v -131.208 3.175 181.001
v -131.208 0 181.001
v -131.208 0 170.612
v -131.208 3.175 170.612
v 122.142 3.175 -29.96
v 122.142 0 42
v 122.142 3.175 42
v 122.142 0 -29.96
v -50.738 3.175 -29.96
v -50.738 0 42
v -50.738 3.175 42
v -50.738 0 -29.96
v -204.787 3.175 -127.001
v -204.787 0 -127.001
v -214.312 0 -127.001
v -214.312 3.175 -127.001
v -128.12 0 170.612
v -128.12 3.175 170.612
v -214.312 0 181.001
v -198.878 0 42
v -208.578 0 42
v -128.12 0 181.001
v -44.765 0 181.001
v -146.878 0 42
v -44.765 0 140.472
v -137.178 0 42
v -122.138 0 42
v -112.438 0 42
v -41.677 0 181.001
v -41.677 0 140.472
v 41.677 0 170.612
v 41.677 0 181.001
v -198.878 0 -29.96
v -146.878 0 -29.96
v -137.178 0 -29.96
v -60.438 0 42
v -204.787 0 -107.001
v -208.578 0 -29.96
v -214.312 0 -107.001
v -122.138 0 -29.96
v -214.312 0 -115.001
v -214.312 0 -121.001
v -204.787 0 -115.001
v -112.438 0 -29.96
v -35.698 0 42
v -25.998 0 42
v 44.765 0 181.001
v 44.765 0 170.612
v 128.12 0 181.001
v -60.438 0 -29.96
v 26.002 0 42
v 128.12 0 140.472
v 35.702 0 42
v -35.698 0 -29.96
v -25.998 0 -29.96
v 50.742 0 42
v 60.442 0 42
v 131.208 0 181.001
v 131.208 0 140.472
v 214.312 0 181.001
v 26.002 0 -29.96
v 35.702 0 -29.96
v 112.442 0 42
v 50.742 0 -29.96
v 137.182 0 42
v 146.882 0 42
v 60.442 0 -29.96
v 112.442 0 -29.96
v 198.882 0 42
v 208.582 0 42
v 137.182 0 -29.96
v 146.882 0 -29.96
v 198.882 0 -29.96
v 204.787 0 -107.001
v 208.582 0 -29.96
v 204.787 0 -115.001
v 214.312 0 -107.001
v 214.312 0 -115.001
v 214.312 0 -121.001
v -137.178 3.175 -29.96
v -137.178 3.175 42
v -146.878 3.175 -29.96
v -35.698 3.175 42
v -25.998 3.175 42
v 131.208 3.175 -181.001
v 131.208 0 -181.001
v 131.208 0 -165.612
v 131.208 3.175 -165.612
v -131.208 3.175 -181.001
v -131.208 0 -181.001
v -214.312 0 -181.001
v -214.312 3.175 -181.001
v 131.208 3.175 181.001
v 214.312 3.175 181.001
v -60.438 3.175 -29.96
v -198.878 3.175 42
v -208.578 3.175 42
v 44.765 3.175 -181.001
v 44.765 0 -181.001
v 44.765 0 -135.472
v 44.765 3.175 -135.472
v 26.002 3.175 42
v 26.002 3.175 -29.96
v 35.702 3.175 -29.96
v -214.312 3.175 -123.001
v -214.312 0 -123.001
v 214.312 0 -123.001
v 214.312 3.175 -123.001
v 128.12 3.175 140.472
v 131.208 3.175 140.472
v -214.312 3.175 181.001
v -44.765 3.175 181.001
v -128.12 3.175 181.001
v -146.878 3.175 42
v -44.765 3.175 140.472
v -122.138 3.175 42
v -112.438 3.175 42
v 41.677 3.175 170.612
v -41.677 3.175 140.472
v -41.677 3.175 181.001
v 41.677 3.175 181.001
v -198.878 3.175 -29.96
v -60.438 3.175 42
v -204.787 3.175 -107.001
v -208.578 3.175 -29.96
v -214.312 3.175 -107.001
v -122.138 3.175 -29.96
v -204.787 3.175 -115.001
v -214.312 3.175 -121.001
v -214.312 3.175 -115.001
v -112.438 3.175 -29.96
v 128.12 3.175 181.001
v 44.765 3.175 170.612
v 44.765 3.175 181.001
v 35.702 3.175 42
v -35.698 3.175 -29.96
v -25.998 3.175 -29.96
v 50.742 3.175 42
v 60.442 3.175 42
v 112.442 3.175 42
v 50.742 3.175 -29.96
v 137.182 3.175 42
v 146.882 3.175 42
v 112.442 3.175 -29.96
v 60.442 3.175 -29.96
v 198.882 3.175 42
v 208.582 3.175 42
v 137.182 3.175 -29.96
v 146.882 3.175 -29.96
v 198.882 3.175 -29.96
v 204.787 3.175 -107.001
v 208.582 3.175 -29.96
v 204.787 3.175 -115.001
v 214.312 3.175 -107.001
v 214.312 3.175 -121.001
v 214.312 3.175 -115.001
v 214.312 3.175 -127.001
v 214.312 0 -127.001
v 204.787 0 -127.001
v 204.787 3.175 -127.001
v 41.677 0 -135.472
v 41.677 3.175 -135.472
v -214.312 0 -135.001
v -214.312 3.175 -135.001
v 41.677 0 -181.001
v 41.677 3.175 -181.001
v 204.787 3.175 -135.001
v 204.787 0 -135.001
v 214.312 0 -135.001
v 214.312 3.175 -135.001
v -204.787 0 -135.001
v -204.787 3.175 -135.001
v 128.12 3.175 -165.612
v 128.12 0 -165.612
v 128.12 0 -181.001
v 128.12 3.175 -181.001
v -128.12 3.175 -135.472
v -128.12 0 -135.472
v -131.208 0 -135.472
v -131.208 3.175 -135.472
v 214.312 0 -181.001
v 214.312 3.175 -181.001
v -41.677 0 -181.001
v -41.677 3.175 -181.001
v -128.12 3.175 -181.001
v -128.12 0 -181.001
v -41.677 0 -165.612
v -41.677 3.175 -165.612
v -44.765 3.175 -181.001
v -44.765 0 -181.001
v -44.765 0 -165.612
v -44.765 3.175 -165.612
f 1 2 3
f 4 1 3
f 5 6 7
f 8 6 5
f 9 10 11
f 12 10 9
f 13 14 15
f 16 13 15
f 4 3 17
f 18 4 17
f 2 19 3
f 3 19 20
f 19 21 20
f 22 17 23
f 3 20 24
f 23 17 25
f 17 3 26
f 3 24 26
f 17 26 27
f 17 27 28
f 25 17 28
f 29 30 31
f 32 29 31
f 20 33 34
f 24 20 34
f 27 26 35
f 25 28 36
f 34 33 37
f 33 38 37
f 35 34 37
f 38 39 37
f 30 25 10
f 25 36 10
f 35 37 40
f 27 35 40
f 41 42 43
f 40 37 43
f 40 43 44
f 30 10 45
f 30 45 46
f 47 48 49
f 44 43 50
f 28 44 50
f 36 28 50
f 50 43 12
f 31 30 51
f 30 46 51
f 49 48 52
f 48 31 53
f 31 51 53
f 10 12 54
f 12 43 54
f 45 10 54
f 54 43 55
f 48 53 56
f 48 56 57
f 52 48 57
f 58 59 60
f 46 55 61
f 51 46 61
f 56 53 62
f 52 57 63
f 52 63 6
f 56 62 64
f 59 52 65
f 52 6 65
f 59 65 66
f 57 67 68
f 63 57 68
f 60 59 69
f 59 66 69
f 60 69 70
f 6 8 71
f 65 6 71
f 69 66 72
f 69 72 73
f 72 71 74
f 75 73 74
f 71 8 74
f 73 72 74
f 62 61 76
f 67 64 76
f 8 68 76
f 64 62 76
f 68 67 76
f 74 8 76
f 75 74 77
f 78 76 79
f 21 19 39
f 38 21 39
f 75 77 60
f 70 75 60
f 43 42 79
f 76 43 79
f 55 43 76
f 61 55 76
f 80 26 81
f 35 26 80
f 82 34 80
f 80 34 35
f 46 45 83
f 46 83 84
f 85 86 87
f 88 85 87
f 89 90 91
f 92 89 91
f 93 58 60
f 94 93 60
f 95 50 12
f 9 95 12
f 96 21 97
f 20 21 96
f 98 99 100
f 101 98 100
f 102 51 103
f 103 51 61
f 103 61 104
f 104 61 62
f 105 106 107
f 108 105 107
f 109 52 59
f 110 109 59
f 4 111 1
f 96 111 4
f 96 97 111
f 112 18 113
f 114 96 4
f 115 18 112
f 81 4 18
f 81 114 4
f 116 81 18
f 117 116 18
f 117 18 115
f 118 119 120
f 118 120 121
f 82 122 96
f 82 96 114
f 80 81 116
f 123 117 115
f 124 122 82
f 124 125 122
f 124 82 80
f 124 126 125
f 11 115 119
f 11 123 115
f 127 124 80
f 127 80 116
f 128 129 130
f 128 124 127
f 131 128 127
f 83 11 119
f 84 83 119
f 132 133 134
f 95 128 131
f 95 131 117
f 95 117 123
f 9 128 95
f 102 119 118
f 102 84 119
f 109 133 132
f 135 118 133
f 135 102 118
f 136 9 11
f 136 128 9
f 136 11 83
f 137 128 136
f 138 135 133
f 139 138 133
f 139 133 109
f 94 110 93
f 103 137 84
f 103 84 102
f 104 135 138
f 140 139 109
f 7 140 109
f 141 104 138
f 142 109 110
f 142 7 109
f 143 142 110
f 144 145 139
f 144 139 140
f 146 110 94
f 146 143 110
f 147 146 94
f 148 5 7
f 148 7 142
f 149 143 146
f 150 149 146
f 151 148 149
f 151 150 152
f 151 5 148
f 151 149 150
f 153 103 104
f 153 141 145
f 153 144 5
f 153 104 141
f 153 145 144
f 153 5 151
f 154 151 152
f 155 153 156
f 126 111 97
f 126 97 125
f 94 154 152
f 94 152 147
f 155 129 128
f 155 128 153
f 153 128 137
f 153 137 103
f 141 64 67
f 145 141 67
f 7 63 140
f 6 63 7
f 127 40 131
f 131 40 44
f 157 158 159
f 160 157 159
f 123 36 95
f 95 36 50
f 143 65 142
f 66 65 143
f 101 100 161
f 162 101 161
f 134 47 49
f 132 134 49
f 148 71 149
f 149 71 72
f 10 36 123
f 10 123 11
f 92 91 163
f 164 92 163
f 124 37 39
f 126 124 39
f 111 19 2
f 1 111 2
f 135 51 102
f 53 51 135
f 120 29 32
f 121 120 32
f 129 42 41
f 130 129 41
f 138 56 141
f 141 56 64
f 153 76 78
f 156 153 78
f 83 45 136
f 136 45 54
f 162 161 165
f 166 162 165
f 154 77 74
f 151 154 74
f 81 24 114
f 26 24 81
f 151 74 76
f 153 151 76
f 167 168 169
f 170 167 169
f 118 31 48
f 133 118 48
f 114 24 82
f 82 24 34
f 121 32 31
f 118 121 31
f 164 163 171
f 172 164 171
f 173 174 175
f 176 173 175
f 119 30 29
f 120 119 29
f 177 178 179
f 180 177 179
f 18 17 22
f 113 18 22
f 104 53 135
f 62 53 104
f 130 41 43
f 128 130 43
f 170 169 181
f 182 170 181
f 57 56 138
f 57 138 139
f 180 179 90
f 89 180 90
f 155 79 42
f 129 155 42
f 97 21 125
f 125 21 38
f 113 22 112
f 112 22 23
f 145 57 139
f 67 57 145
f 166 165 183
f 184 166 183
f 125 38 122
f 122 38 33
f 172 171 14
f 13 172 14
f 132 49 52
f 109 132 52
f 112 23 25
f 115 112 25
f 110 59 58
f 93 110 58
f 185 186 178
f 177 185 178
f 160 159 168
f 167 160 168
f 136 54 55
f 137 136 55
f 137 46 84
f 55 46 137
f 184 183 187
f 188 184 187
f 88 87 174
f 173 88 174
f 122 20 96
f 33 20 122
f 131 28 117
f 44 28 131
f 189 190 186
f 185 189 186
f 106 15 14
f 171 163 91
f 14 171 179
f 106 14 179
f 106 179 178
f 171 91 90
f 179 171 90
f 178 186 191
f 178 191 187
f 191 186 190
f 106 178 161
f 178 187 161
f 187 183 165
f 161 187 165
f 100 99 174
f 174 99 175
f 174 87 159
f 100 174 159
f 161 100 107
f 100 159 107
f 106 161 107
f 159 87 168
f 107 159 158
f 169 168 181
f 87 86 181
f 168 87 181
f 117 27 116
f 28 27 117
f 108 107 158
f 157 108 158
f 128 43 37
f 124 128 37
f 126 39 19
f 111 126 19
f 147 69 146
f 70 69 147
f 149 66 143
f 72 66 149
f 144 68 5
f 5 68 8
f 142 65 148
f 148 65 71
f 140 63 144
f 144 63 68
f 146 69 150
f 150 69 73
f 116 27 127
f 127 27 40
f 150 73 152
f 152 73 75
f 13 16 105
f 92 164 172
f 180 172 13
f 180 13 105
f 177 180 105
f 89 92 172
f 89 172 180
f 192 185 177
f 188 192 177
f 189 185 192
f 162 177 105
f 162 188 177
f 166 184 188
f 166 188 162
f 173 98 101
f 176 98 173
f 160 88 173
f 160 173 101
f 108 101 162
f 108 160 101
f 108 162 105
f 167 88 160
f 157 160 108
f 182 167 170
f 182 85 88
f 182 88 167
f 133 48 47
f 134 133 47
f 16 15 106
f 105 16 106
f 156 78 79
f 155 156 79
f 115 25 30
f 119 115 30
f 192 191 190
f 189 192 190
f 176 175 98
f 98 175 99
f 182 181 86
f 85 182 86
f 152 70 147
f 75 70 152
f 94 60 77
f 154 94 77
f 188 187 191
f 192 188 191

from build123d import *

# Parameters (mm, degrees)
SKETCH1_W           = 9.7
SKETCH1_H           = 71.96
BOSS_EXTRUDE1_DEPTH = 3.175
BOSS_EXTRUDE2_DEPTH = 3.175


with BuildPart() as part:
    # Sketch1 → Boss-Extrude1 (new body)
    with BuildSketch(Plane(origin=(0, 0, 0), x_dir=(1, 0, 0), z_dir=(0, 1, 0))):
        Polygon((-214.312, 121.0008), (-214.312, 115.0008), (-204.787, 115.0008), (-204.787, 107.0008), (-214.312, 107.0008), (-214.312, -181.0008), (-131.2076, -181.0008), (-131.2076, -170.612), (-128.1196, -170.612), (-128.1196, -181.0008), (-44.7652, -181.0008), (-44.7652, -140.472), (-41.6772, -140.472), (-41.6772, -181.0008), (41.6772, -181.0008), (41.6772, -170.612), (44.7652, -170.612), (44.7652, -181.0008), (128.1196, -181.0008), (128.1196, -140.472), (131.2076, -140.472), (131.2076, -181.0008), (214.312, -181.0008), (214.312, 107.0008), (204.787, 107.0008), (204.787, 115.0008), (214.312, 115.0008), (214.312, 121.0008), align=None)
        with Locations((-117.2876, -6.02)):
            Rectangle(SKETCH1_W, SKETCH1_H, mode=Mode.SUBTRACT)
        with Locations((-55.5876, -6.02)):
            Rectangle(SKETCH1_W, SKETCH1_H, mode=Mode.SUBTRACT)
        with Locations((-142.0276, -6.02)):
            Rectangle(SKETCH1_W, SKETCH1_H, mode=Mode.SUBTRACT)
        with Locations((-203.7276, -6.02)):
            Rectangle(SKETCH1_W, SKETCH1_H, mode=Mode.SUBTRACT)
        with Locations((30.8524, -6.02)):
            Rectangle(SKETCH1_W, SKETCH1_H, mode=Mode.SUBTRACT)
        with Locations((-30.8476, -6.02)):
            Rectangle(SKETCH1_W, SKETCH1_H, mode=Mode.SUBTRACT)
        with Locations((117.2924, -6.02)):
            Rectangle(SKETCH1_W, SKETCH1_H, mode=Mode.SUBTRACT)
        with Locations((55.5924, -6.02)):
            Rectangle(SKETCH1_W, SKETCH1_H, mode=Mode.SUBTRACT)
        with Locations((203.7324, -6.02)):
            Rectangle(SKETCH1_W, SKETCH1_H, mode=Mode.SUBTRACT)
        with Locations((142.0324, -6.02)):
            Rectangle(SKETCH1_W, SKETCH1_H, mode=Mode.SUBTRACT)
    extrude(amount=BOSS_EXTRUDE1_DEPTH)


with BuildPart() as body_2:
    # Sketch1<4> → Boss-Extrude2 (new body)
    with BuildSketch(Plane(origin=(0, 0, 0), x_dir=(1, 0, 0), z_dir=(0, 1, 0))):
        Polygon((-128.1196, 135.472), (-131.2076, 135.472), (-131.2076, 181.0008), (-214.312, 181.0008), (-214.312, 135.0008), (-204.787, 135.0008), (-204.787, 127.0008), (-214.312, 127.0008), (-214.312, 123.0008), (214.312, 123.0008), (214.312, 127.0008), (204.787, 127.0008), (204.787, 135.0008), (214.312, 135.0008), (214.312, 181.0008), (131.2076, 181.0008), (131.2076, 165.612), (128.1196, 165.612), (128.1196, 181.0008), (44.7652, 181.0008), (44.7652, 135.472), (41.6772, 135.472), (41.6772, 181.0008), (-41.6772, 181.0008), (-41.6772, 165.612), (-44.7652, 165.612), (-44.7652, 181.0008), (-128.1196, 181.0008), align=None)
    extrude(amount=BOSS_EXTRUDE2_DEPTH)


solid = Compound([part.part, body_2.part])
